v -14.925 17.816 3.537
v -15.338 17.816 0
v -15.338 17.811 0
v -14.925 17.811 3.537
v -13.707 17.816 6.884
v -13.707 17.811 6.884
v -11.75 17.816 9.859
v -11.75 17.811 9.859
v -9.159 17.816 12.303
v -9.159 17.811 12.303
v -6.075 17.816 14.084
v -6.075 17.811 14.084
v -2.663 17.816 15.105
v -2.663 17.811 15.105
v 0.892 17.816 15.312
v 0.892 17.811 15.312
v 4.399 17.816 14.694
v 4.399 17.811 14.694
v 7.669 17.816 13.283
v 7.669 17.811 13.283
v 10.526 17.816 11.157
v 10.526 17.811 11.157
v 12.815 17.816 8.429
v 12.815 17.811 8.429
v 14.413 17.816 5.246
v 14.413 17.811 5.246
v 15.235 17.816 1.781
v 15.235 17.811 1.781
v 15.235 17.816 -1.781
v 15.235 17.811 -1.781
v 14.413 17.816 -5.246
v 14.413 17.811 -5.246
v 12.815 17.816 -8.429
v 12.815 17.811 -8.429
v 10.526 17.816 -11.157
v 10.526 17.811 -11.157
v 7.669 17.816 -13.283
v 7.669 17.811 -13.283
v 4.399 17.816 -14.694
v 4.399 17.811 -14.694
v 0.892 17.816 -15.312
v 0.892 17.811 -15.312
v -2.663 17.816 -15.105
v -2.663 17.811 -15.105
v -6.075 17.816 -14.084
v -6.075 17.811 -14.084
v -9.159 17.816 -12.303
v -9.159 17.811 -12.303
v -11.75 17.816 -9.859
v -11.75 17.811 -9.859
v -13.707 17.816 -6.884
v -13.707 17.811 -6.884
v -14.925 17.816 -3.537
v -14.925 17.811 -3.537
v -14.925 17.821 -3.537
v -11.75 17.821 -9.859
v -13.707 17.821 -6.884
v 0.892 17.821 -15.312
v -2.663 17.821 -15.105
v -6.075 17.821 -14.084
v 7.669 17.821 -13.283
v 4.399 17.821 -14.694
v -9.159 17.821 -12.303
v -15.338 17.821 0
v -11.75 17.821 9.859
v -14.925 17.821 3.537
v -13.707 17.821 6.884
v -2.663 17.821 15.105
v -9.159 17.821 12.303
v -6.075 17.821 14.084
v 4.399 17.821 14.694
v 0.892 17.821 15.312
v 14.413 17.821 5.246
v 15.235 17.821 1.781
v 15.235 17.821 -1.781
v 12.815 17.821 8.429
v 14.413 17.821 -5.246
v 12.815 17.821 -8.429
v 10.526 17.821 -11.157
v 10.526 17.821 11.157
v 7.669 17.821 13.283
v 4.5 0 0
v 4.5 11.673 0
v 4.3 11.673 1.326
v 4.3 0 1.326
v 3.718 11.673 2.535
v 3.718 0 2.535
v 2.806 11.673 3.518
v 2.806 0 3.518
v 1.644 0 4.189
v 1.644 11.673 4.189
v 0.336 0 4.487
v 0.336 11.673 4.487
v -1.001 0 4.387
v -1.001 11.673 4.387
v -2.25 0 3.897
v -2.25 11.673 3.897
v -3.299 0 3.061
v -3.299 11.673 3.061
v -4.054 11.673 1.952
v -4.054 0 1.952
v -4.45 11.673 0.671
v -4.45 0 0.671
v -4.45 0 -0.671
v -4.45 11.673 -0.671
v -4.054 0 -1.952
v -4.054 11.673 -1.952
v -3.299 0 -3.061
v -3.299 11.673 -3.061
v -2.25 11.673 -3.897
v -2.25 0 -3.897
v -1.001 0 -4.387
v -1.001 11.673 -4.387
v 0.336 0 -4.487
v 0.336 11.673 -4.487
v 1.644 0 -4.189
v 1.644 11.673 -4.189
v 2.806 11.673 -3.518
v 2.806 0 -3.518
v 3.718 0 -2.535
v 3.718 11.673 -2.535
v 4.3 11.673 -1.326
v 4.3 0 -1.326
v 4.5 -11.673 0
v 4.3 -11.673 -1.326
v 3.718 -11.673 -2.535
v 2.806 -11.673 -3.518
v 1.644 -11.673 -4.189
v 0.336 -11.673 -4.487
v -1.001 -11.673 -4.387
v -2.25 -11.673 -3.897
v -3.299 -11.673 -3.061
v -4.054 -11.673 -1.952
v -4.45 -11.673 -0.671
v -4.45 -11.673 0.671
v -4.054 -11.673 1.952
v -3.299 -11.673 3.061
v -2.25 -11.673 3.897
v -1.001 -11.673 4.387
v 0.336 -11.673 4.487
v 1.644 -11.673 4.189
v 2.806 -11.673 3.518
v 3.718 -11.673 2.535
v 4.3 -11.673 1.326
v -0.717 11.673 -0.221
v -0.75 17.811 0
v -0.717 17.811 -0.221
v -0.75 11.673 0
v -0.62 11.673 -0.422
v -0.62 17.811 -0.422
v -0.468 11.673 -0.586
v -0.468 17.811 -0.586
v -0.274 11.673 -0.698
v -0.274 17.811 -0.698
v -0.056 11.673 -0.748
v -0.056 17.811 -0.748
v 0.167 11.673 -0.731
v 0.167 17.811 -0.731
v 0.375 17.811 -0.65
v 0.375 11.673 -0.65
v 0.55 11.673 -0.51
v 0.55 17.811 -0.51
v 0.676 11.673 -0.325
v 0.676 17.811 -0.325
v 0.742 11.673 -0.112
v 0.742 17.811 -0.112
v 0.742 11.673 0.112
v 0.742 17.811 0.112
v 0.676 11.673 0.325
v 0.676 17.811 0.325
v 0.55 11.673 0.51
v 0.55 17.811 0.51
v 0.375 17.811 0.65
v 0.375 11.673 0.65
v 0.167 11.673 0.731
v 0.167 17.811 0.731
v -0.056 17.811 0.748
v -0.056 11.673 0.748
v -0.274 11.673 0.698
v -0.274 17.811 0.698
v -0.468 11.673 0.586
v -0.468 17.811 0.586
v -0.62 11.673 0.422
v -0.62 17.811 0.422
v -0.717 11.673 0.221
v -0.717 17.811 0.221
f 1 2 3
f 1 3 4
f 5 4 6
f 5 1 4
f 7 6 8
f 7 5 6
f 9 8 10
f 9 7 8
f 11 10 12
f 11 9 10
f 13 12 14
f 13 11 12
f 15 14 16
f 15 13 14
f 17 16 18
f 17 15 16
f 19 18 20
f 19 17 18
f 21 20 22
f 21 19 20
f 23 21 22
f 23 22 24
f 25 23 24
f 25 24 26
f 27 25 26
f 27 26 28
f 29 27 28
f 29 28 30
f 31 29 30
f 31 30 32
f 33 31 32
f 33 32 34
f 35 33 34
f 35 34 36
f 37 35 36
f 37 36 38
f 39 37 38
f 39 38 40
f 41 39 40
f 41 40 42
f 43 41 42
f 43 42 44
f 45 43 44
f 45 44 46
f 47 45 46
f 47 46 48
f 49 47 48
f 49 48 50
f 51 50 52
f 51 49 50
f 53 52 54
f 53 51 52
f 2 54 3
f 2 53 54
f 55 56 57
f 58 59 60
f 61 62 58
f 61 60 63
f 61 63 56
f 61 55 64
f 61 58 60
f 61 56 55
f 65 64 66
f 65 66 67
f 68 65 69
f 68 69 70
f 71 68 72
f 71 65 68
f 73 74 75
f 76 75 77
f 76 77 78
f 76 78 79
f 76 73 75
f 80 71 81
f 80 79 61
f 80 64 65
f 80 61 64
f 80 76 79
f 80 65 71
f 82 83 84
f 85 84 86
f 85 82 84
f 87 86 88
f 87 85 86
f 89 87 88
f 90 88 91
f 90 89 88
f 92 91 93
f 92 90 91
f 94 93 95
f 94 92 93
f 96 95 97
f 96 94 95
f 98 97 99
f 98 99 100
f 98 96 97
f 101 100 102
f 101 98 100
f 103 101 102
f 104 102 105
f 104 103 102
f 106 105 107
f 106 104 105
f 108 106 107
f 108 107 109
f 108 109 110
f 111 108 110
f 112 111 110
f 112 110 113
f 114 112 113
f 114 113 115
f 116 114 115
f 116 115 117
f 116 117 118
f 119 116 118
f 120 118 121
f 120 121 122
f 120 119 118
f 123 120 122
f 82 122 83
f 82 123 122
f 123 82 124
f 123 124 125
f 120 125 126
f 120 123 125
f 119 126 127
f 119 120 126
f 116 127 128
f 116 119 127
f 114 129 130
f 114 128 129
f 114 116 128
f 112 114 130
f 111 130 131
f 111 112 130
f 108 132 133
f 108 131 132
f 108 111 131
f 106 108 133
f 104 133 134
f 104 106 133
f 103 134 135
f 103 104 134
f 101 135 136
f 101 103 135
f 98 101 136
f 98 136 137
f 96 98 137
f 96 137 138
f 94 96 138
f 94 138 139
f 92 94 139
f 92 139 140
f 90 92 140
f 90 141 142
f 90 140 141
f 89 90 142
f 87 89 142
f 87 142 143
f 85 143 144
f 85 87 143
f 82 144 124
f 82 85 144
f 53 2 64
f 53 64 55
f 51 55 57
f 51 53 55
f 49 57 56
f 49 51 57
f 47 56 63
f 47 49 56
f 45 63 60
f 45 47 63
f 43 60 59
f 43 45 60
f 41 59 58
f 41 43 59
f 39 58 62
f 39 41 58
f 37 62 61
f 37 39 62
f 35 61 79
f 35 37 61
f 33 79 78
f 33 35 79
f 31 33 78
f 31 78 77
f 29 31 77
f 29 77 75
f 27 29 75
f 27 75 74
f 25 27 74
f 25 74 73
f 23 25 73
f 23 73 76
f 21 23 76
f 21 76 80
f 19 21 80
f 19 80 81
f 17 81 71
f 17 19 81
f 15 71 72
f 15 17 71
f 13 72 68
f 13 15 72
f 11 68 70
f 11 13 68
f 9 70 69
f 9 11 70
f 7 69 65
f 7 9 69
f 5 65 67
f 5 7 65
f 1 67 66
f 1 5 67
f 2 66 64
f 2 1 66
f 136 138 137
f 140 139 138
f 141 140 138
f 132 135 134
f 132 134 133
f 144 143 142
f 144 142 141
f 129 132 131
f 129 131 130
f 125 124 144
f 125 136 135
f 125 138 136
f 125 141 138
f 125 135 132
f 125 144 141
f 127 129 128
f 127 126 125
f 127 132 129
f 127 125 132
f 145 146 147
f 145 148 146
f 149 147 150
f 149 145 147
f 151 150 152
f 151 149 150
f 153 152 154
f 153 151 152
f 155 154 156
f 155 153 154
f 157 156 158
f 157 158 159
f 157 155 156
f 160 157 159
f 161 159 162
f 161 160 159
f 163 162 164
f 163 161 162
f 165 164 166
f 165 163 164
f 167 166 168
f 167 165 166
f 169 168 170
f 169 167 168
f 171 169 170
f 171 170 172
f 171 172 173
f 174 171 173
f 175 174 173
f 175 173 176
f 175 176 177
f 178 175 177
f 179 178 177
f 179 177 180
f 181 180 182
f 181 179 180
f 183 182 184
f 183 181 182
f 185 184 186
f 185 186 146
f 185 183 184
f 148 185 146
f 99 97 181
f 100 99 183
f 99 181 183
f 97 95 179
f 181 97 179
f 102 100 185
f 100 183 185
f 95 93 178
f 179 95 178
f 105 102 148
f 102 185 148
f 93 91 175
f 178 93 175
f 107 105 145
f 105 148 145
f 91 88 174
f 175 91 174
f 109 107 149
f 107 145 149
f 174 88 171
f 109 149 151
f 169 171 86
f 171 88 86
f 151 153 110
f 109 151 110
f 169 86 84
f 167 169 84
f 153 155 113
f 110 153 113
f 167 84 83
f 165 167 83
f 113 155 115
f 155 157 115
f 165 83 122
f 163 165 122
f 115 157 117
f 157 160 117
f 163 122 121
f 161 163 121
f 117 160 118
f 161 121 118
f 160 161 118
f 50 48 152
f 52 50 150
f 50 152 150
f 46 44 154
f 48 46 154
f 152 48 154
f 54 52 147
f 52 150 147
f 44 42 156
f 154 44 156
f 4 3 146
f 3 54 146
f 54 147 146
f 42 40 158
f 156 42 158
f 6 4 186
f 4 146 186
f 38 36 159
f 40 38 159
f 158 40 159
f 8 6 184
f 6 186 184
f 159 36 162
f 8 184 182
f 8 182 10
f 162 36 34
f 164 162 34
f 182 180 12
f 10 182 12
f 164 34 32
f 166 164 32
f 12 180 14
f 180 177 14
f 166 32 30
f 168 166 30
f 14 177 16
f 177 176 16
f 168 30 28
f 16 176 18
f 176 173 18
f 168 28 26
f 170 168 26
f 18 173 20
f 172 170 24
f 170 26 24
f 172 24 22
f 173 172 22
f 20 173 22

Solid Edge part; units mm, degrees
sketch "Sketch1" plane through (0, 0, 0) normal (0, -1, 0) x (1, 0, 0)
  circle A0 centre (0, 0) radius 4.5
extrude "Protrusion1" add sketch "Sketch1" along normal mid plane 23.3462
sketch "Sketch2" plane through (0, 11.6731, 0) normal (0, 1, 0) x (-1, 0, 0)
  circle A0 centre (0, 0) radius 0.75
extrude "ExtrudedProtrusion_2" add sketch "Sketch2" along normal mid plane 12.2854
sketch "Sketch3" plane through (0, 17.8158, 0) normal (0, 1, 0) x (-1, 0, 0)
  circle A0 centre (0, 0) radius 15.3384
extrude "ExtrudedProtrusion_3" add sketch "Sketch3" along normal mid plane 0.01
